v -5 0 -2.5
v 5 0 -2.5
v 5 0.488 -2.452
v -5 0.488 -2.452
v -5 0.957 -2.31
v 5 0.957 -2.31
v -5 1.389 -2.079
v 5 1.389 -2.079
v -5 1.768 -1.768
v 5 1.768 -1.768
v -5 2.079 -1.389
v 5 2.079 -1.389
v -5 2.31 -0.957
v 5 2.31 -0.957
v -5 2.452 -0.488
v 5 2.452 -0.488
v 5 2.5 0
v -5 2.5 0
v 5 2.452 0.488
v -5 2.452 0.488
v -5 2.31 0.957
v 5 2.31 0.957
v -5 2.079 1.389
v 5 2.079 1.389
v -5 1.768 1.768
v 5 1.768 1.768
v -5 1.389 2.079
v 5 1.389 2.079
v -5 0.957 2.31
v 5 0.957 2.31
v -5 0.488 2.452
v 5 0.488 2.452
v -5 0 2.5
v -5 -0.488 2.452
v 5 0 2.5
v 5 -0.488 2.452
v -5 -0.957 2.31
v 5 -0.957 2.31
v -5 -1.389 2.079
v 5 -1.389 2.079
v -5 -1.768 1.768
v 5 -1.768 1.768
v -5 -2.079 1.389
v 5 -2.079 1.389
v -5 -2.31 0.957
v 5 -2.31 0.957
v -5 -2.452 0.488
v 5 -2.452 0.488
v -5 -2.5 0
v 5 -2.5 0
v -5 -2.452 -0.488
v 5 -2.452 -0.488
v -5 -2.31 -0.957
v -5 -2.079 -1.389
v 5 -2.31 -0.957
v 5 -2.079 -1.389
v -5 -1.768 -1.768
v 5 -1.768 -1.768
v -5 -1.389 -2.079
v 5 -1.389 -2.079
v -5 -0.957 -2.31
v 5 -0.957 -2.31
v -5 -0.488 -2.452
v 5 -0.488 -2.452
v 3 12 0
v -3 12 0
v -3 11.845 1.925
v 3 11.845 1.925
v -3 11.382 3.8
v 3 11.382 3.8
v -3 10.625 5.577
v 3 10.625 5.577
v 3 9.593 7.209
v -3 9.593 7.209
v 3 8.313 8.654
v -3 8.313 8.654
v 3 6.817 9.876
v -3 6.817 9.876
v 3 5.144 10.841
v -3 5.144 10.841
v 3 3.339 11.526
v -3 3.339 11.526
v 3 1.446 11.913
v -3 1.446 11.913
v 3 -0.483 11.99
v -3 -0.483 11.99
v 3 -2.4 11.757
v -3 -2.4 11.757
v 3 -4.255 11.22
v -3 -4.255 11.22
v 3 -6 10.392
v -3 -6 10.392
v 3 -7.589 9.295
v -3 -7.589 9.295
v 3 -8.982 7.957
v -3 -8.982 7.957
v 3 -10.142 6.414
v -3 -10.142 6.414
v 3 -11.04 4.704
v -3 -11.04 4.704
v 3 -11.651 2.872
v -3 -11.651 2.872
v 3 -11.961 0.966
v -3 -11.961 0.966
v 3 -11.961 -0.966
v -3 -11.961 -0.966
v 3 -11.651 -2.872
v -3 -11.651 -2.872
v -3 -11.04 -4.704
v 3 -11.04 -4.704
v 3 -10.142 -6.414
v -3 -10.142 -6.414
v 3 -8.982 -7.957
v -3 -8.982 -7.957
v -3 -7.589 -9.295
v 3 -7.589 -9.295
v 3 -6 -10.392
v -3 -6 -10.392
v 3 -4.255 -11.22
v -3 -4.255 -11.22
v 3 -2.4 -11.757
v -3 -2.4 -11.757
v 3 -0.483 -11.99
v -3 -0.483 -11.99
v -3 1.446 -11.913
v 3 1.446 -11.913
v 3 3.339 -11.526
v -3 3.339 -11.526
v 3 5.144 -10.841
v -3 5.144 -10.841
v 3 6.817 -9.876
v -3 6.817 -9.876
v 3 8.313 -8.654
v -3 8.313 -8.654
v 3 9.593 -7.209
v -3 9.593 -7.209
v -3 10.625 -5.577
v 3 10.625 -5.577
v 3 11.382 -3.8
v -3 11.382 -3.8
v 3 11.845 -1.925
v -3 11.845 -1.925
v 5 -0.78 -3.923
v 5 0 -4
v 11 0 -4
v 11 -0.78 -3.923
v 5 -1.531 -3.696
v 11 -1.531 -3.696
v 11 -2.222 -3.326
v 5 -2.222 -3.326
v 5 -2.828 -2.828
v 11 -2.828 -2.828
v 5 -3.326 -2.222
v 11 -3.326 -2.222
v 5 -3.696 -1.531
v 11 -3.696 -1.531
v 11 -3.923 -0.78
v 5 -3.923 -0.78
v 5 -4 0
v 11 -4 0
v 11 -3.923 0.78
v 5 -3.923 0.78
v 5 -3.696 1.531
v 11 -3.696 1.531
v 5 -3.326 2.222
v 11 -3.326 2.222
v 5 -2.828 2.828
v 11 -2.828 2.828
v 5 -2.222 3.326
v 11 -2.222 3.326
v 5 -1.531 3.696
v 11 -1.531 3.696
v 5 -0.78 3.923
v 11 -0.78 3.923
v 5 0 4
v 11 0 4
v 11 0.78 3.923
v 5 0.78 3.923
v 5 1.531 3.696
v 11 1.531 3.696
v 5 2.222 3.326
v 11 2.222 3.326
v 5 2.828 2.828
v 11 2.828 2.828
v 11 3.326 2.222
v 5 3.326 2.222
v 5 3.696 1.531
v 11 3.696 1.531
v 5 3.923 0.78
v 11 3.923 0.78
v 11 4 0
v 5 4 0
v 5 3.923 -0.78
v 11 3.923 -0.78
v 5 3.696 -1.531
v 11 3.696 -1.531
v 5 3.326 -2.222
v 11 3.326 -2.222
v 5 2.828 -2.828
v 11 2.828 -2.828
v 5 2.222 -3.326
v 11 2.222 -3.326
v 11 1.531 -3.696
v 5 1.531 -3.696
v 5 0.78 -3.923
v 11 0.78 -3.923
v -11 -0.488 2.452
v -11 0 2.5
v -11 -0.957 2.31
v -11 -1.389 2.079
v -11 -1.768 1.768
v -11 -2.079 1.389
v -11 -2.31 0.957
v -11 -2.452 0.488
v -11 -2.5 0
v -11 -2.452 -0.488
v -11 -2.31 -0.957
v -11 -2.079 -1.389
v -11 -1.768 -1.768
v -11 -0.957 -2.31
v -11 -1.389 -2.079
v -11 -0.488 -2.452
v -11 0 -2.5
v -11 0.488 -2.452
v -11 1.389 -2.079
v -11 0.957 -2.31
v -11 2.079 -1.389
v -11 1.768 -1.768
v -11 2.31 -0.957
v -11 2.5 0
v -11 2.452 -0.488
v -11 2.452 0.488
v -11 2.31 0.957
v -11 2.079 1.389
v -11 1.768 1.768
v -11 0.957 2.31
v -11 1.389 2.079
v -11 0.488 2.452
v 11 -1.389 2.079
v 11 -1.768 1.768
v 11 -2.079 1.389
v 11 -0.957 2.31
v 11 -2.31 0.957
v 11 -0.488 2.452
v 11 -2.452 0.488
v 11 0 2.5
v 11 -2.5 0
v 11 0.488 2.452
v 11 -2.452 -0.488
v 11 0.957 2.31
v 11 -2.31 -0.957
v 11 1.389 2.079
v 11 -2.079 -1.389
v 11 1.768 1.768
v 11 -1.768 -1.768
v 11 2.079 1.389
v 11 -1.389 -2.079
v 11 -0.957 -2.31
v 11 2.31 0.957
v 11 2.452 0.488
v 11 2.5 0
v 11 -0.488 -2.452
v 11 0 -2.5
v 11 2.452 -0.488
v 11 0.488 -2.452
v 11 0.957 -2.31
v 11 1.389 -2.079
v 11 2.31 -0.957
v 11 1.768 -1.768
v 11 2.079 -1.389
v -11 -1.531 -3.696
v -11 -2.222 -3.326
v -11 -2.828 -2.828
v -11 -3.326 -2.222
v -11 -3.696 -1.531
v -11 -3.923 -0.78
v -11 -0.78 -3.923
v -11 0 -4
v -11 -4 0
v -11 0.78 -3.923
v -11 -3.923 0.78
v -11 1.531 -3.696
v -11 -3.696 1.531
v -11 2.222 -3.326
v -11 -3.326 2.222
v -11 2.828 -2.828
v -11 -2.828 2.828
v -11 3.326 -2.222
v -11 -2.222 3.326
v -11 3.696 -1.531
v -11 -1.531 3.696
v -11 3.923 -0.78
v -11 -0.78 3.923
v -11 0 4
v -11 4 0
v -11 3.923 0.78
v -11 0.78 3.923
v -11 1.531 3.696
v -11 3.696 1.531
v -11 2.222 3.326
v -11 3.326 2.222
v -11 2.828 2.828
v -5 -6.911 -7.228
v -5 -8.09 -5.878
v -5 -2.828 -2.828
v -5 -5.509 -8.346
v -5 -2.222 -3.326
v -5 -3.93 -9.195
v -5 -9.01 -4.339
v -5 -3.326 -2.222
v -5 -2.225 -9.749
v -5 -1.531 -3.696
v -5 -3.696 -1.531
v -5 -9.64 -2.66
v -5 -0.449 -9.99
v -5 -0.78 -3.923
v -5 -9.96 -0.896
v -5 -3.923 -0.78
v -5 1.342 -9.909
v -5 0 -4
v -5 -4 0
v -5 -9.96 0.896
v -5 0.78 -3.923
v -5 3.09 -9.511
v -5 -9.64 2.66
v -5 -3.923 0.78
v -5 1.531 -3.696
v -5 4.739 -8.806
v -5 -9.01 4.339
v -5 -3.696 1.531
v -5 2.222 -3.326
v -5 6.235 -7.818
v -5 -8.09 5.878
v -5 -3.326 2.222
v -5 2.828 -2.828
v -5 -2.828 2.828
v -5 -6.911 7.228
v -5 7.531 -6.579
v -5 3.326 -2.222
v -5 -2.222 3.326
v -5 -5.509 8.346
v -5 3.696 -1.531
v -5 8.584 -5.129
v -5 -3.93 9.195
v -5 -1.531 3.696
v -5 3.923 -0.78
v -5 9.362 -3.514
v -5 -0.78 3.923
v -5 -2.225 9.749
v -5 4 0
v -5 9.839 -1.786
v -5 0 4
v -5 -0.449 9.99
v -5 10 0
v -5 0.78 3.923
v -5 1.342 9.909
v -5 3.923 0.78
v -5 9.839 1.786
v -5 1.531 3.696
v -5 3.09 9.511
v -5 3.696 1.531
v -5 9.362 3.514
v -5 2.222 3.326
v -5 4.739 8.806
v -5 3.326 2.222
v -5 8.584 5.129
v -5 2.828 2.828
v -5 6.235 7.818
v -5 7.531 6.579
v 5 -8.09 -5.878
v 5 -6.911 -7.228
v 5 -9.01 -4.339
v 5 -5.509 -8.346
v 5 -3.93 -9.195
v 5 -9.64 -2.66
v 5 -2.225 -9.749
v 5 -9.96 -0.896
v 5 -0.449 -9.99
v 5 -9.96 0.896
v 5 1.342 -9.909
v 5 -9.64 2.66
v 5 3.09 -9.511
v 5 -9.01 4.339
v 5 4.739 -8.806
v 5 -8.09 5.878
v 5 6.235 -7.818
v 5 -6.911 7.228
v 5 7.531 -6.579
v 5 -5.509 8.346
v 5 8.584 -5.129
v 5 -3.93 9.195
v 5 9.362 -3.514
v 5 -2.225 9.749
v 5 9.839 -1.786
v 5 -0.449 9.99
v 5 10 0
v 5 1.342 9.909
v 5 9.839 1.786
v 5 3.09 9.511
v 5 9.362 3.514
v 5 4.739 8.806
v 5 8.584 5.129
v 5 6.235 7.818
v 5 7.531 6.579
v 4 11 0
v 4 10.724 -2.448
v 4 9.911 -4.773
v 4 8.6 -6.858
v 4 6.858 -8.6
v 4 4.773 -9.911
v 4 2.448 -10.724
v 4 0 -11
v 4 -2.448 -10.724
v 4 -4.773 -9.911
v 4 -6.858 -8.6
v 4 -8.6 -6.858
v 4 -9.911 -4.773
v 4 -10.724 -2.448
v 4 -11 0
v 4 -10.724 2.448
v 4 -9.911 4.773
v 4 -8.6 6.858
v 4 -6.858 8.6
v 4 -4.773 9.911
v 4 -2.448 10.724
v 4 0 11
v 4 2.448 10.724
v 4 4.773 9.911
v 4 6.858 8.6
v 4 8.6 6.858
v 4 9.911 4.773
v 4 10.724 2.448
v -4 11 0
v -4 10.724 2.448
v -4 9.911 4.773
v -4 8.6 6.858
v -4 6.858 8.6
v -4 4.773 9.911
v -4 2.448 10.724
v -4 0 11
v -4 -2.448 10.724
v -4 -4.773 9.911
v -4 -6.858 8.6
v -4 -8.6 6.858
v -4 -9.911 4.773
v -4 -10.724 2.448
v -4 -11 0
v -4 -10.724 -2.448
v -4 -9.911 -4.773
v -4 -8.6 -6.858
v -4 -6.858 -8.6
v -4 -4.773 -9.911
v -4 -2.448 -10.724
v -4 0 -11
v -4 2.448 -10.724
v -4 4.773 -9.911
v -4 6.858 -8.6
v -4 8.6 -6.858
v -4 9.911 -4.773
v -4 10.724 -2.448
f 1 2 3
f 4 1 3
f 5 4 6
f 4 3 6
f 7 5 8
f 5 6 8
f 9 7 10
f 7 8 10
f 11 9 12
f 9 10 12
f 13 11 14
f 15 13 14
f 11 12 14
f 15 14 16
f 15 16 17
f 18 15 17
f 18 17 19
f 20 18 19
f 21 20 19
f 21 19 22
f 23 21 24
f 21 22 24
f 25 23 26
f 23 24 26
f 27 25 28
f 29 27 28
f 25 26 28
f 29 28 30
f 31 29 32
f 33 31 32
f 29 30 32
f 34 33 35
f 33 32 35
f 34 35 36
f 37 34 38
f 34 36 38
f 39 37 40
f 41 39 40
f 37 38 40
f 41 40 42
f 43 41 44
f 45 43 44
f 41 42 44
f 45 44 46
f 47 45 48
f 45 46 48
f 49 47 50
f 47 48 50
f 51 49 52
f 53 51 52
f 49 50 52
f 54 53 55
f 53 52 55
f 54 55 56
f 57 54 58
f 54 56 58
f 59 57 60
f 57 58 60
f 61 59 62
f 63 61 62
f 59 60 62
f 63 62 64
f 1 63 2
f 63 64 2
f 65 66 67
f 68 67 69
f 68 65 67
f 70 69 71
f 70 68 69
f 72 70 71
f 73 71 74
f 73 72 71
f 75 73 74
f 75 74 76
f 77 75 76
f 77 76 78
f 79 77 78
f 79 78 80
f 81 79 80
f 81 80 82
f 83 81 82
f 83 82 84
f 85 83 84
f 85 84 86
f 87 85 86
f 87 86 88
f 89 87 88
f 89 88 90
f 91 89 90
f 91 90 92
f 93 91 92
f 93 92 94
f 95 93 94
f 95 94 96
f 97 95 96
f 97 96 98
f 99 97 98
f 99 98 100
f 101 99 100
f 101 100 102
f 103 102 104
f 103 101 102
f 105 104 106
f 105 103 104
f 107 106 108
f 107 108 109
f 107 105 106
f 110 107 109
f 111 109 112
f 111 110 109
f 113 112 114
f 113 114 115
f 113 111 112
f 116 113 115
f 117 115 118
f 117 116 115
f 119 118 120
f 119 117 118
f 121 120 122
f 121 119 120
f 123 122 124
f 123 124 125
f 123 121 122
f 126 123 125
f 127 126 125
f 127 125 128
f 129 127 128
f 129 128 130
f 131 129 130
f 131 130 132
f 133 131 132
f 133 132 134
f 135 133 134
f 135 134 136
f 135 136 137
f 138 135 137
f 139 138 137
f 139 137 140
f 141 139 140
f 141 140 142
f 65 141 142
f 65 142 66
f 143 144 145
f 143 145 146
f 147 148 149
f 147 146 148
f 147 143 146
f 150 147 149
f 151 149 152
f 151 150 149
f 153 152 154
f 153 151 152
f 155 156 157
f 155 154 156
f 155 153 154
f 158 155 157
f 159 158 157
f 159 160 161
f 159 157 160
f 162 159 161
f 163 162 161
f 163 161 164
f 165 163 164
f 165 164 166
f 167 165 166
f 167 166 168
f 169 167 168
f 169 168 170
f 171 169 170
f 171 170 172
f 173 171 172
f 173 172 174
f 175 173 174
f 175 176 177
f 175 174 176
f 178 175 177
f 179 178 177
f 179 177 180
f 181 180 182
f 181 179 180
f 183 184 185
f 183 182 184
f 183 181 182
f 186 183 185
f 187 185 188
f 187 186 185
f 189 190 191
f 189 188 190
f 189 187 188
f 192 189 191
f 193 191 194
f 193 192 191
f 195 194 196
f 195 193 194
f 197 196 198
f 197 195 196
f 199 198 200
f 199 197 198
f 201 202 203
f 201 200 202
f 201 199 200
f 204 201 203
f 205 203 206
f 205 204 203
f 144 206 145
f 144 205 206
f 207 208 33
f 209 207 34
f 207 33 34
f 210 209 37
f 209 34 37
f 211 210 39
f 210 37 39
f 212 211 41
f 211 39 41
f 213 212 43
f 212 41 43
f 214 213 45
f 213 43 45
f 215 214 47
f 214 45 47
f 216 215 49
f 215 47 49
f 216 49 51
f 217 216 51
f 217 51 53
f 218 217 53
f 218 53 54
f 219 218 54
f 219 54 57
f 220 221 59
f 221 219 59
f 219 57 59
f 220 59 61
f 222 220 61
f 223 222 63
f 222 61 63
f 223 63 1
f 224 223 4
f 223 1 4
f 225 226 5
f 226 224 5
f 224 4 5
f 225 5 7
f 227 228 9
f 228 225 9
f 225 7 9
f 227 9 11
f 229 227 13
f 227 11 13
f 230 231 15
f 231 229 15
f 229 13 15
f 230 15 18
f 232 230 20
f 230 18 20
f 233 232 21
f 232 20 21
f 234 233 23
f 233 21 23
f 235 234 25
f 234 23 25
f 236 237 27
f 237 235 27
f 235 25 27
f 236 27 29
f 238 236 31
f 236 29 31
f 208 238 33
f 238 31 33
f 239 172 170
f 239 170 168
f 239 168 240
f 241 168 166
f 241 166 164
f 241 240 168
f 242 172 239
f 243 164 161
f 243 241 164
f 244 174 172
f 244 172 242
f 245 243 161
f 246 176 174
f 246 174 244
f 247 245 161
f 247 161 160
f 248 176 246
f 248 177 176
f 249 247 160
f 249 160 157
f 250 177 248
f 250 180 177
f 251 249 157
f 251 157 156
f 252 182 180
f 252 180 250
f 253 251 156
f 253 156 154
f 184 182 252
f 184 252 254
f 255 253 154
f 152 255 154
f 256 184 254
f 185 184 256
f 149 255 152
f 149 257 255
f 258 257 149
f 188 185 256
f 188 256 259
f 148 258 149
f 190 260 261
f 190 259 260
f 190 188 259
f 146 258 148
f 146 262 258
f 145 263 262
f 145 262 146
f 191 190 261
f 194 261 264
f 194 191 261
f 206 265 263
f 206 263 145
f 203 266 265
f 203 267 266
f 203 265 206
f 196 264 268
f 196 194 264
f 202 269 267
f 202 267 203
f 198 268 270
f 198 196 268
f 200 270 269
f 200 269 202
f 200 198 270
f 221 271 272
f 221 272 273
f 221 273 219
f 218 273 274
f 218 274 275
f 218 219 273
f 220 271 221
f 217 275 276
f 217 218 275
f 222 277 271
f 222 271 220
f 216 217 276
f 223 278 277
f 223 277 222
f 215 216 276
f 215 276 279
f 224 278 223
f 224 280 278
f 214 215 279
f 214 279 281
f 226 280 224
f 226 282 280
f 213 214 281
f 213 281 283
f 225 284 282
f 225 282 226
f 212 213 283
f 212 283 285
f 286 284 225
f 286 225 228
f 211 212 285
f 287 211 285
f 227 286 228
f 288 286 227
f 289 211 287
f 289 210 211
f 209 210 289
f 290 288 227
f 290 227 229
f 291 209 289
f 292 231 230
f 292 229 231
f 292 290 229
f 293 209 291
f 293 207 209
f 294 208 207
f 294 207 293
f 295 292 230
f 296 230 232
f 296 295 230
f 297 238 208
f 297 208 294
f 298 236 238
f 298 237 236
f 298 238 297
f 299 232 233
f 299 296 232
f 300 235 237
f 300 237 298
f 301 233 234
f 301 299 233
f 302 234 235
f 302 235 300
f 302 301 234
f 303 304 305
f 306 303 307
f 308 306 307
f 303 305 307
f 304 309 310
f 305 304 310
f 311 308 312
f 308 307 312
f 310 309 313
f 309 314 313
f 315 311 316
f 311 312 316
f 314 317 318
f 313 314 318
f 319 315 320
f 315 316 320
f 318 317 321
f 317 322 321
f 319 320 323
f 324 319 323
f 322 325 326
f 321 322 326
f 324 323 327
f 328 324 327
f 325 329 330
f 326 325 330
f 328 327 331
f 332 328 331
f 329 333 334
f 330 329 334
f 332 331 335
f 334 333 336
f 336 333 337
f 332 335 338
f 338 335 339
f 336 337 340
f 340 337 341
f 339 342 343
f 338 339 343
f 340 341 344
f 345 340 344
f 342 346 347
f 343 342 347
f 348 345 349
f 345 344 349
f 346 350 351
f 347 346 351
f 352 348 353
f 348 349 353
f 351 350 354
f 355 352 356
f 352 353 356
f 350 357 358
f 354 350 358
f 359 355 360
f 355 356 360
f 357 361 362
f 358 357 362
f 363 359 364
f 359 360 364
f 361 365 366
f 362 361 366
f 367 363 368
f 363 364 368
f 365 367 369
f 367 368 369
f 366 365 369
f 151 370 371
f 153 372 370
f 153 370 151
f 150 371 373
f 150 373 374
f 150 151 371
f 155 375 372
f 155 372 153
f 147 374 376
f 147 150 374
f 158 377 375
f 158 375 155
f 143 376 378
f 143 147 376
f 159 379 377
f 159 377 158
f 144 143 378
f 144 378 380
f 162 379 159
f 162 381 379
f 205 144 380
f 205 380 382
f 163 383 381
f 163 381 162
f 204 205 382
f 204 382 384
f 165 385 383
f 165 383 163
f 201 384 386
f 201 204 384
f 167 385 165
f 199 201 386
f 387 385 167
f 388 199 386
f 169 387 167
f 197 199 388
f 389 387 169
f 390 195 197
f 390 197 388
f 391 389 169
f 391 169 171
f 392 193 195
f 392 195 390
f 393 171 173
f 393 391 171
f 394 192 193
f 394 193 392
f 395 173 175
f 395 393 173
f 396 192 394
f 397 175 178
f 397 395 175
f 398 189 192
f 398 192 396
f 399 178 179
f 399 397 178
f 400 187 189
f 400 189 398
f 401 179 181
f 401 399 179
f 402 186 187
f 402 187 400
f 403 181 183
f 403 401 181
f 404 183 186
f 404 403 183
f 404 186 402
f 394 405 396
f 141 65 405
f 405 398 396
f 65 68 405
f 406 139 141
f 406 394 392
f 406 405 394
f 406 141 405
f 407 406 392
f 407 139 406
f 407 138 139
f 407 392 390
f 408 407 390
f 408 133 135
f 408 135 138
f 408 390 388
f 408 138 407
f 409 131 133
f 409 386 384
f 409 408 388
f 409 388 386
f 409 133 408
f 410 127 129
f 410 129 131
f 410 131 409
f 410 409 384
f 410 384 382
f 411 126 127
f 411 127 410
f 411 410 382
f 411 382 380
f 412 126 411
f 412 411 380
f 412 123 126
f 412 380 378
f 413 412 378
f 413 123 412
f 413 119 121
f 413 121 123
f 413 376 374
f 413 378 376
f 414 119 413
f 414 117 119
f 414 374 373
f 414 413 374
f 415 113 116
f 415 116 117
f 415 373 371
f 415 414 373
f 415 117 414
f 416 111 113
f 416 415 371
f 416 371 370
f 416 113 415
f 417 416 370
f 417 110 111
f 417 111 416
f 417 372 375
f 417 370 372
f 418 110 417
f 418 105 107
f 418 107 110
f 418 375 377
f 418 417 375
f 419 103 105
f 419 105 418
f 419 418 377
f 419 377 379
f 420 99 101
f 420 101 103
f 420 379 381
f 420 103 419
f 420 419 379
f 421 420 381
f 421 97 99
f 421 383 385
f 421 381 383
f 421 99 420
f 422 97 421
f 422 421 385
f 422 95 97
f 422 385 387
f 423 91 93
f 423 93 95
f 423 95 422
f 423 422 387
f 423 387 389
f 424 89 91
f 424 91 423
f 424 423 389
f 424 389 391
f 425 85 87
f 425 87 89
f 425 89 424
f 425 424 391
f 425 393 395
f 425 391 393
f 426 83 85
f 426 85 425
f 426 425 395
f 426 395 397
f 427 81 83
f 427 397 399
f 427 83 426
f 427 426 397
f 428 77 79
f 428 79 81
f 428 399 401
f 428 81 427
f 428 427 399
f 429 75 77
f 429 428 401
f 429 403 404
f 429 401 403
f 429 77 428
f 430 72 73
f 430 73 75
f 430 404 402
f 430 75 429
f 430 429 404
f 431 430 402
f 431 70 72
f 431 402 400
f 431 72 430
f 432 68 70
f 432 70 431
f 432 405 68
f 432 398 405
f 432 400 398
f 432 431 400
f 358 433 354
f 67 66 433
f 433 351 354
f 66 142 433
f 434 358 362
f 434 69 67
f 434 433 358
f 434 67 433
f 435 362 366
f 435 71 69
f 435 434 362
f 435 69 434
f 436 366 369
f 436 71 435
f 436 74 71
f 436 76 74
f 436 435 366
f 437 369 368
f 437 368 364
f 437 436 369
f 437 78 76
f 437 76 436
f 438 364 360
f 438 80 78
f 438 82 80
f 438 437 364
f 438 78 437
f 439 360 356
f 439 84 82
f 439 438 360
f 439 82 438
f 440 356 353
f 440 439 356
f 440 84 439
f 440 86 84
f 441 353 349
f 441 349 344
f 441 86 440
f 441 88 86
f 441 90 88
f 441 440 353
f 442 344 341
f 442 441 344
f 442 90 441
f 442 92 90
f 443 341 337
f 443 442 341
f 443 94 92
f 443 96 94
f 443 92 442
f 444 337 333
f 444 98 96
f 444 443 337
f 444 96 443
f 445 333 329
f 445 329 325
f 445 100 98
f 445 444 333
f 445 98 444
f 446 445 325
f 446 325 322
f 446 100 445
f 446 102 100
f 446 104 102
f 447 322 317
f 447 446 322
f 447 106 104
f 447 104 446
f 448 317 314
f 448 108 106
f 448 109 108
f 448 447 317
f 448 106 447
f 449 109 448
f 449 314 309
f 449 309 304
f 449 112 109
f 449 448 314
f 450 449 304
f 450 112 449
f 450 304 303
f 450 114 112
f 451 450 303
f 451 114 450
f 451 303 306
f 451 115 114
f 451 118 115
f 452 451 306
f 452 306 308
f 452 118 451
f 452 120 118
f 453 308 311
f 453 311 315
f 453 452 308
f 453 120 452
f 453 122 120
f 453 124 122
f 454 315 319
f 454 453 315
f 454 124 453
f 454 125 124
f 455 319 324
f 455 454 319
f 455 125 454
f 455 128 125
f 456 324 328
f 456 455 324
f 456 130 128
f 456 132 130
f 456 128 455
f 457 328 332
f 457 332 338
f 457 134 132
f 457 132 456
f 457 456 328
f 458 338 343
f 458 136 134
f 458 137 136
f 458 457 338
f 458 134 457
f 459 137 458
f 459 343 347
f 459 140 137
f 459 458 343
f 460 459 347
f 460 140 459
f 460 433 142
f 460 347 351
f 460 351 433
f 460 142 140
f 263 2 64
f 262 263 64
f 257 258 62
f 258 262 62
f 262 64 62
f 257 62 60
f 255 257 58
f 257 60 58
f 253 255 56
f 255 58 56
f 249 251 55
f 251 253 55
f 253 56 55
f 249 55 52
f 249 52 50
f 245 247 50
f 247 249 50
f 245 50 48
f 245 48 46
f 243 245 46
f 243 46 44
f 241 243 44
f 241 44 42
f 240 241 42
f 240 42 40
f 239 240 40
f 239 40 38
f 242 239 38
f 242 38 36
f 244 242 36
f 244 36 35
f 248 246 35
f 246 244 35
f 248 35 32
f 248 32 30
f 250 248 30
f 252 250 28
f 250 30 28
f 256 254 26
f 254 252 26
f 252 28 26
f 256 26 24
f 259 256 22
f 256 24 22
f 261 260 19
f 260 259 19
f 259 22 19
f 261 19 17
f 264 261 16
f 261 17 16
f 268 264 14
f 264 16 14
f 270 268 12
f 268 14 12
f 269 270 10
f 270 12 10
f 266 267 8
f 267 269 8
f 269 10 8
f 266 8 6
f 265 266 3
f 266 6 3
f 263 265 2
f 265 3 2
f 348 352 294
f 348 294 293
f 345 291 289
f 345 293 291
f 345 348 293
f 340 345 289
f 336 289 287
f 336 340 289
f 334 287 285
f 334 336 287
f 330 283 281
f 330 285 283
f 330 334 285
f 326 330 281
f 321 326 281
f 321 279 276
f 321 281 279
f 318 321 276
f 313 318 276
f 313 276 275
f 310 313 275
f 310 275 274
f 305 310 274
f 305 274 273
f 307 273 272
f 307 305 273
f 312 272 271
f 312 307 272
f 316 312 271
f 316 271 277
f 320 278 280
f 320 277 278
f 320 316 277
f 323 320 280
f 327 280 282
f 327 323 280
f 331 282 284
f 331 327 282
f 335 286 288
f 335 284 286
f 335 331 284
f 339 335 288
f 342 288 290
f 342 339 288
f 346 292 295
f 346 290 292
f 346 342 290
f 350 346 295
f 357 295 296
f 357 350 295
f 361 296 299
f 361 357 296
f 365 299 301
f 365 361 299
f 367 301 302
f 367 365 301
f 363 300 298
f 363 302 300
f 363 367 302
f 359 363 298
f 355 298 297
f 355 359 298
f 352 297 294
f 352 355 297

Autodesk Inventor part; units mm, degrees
ref_plane "YZ Plane" through (0, 0, 0) normal (1, 0, 0) x (0, 1, 0)
ref_plane "XZ Plane" through (0, 0, 0) normal (0, 1, 0) x (-1, 0, 0)
ref_plane "XY Plane" through (0, 0, 0) normal (0, 0, 1) x (1, 0, 0)
sketch "Sketch1" plane through (0, 0, 0) normal (0, 0, 1) x (1, 0, 0)
  line L0 (-5, 0) -> (5, 0)
  line L1 (-5, 0) -> (-5, 10)
  line L2 (-5, 10) -> (-3, 12)
  line L3 (-3, 12) -> (3, 12)
  line L4 (3, 12) -> (5, 10)
  line L5 (5, 10) -> (5, 0)
  point P0 (0, 0)
  point P1 (0, 0)
  point P2 (0, 12)
  dimension "d0" = 10
  dimension "d1" = 24
  dimension "d2" = 6
  dimension "d3" = 20
revolve "Revolution1" add sketch "Sketch1" angle 360 about axis through (-5, 0, 0) along (1, 0, 0)
sketch "Sketch2" plane through (5, 0, 0) normal (1, 0, 0) x (0, 0, -1)
  circle A0 centre (0, 0) radius 2.5
  dimension "d5" = 5
extrude "Extrusion1" cut sketch "Sketch2" against normal through all
sketch "Sketch3" plane through (5, 0, 0) normal (1, 0, 0) x (0, 0, -1)
  circle A0 centre (0, 0) radius 4
  circle A1 centre (0, 0) radius 2.5 projected
  dimension "d8" = 8
extrude "Extrusion2" add sketch "Sketch3" along normal blind 6
sketch "Sketch4" plane through (-5, 0, 0) normal (-1, 0, 0) x (0, 0, 1)
  circle A0 centre (0, 0) radius 2.5 projected
  circle A1 centre (0, 0) radius 4
  dimension "d11" = 8
extrude "Extrusion3" add sketch "Sketch4" along normal blind 6
properties part number "wheel"
